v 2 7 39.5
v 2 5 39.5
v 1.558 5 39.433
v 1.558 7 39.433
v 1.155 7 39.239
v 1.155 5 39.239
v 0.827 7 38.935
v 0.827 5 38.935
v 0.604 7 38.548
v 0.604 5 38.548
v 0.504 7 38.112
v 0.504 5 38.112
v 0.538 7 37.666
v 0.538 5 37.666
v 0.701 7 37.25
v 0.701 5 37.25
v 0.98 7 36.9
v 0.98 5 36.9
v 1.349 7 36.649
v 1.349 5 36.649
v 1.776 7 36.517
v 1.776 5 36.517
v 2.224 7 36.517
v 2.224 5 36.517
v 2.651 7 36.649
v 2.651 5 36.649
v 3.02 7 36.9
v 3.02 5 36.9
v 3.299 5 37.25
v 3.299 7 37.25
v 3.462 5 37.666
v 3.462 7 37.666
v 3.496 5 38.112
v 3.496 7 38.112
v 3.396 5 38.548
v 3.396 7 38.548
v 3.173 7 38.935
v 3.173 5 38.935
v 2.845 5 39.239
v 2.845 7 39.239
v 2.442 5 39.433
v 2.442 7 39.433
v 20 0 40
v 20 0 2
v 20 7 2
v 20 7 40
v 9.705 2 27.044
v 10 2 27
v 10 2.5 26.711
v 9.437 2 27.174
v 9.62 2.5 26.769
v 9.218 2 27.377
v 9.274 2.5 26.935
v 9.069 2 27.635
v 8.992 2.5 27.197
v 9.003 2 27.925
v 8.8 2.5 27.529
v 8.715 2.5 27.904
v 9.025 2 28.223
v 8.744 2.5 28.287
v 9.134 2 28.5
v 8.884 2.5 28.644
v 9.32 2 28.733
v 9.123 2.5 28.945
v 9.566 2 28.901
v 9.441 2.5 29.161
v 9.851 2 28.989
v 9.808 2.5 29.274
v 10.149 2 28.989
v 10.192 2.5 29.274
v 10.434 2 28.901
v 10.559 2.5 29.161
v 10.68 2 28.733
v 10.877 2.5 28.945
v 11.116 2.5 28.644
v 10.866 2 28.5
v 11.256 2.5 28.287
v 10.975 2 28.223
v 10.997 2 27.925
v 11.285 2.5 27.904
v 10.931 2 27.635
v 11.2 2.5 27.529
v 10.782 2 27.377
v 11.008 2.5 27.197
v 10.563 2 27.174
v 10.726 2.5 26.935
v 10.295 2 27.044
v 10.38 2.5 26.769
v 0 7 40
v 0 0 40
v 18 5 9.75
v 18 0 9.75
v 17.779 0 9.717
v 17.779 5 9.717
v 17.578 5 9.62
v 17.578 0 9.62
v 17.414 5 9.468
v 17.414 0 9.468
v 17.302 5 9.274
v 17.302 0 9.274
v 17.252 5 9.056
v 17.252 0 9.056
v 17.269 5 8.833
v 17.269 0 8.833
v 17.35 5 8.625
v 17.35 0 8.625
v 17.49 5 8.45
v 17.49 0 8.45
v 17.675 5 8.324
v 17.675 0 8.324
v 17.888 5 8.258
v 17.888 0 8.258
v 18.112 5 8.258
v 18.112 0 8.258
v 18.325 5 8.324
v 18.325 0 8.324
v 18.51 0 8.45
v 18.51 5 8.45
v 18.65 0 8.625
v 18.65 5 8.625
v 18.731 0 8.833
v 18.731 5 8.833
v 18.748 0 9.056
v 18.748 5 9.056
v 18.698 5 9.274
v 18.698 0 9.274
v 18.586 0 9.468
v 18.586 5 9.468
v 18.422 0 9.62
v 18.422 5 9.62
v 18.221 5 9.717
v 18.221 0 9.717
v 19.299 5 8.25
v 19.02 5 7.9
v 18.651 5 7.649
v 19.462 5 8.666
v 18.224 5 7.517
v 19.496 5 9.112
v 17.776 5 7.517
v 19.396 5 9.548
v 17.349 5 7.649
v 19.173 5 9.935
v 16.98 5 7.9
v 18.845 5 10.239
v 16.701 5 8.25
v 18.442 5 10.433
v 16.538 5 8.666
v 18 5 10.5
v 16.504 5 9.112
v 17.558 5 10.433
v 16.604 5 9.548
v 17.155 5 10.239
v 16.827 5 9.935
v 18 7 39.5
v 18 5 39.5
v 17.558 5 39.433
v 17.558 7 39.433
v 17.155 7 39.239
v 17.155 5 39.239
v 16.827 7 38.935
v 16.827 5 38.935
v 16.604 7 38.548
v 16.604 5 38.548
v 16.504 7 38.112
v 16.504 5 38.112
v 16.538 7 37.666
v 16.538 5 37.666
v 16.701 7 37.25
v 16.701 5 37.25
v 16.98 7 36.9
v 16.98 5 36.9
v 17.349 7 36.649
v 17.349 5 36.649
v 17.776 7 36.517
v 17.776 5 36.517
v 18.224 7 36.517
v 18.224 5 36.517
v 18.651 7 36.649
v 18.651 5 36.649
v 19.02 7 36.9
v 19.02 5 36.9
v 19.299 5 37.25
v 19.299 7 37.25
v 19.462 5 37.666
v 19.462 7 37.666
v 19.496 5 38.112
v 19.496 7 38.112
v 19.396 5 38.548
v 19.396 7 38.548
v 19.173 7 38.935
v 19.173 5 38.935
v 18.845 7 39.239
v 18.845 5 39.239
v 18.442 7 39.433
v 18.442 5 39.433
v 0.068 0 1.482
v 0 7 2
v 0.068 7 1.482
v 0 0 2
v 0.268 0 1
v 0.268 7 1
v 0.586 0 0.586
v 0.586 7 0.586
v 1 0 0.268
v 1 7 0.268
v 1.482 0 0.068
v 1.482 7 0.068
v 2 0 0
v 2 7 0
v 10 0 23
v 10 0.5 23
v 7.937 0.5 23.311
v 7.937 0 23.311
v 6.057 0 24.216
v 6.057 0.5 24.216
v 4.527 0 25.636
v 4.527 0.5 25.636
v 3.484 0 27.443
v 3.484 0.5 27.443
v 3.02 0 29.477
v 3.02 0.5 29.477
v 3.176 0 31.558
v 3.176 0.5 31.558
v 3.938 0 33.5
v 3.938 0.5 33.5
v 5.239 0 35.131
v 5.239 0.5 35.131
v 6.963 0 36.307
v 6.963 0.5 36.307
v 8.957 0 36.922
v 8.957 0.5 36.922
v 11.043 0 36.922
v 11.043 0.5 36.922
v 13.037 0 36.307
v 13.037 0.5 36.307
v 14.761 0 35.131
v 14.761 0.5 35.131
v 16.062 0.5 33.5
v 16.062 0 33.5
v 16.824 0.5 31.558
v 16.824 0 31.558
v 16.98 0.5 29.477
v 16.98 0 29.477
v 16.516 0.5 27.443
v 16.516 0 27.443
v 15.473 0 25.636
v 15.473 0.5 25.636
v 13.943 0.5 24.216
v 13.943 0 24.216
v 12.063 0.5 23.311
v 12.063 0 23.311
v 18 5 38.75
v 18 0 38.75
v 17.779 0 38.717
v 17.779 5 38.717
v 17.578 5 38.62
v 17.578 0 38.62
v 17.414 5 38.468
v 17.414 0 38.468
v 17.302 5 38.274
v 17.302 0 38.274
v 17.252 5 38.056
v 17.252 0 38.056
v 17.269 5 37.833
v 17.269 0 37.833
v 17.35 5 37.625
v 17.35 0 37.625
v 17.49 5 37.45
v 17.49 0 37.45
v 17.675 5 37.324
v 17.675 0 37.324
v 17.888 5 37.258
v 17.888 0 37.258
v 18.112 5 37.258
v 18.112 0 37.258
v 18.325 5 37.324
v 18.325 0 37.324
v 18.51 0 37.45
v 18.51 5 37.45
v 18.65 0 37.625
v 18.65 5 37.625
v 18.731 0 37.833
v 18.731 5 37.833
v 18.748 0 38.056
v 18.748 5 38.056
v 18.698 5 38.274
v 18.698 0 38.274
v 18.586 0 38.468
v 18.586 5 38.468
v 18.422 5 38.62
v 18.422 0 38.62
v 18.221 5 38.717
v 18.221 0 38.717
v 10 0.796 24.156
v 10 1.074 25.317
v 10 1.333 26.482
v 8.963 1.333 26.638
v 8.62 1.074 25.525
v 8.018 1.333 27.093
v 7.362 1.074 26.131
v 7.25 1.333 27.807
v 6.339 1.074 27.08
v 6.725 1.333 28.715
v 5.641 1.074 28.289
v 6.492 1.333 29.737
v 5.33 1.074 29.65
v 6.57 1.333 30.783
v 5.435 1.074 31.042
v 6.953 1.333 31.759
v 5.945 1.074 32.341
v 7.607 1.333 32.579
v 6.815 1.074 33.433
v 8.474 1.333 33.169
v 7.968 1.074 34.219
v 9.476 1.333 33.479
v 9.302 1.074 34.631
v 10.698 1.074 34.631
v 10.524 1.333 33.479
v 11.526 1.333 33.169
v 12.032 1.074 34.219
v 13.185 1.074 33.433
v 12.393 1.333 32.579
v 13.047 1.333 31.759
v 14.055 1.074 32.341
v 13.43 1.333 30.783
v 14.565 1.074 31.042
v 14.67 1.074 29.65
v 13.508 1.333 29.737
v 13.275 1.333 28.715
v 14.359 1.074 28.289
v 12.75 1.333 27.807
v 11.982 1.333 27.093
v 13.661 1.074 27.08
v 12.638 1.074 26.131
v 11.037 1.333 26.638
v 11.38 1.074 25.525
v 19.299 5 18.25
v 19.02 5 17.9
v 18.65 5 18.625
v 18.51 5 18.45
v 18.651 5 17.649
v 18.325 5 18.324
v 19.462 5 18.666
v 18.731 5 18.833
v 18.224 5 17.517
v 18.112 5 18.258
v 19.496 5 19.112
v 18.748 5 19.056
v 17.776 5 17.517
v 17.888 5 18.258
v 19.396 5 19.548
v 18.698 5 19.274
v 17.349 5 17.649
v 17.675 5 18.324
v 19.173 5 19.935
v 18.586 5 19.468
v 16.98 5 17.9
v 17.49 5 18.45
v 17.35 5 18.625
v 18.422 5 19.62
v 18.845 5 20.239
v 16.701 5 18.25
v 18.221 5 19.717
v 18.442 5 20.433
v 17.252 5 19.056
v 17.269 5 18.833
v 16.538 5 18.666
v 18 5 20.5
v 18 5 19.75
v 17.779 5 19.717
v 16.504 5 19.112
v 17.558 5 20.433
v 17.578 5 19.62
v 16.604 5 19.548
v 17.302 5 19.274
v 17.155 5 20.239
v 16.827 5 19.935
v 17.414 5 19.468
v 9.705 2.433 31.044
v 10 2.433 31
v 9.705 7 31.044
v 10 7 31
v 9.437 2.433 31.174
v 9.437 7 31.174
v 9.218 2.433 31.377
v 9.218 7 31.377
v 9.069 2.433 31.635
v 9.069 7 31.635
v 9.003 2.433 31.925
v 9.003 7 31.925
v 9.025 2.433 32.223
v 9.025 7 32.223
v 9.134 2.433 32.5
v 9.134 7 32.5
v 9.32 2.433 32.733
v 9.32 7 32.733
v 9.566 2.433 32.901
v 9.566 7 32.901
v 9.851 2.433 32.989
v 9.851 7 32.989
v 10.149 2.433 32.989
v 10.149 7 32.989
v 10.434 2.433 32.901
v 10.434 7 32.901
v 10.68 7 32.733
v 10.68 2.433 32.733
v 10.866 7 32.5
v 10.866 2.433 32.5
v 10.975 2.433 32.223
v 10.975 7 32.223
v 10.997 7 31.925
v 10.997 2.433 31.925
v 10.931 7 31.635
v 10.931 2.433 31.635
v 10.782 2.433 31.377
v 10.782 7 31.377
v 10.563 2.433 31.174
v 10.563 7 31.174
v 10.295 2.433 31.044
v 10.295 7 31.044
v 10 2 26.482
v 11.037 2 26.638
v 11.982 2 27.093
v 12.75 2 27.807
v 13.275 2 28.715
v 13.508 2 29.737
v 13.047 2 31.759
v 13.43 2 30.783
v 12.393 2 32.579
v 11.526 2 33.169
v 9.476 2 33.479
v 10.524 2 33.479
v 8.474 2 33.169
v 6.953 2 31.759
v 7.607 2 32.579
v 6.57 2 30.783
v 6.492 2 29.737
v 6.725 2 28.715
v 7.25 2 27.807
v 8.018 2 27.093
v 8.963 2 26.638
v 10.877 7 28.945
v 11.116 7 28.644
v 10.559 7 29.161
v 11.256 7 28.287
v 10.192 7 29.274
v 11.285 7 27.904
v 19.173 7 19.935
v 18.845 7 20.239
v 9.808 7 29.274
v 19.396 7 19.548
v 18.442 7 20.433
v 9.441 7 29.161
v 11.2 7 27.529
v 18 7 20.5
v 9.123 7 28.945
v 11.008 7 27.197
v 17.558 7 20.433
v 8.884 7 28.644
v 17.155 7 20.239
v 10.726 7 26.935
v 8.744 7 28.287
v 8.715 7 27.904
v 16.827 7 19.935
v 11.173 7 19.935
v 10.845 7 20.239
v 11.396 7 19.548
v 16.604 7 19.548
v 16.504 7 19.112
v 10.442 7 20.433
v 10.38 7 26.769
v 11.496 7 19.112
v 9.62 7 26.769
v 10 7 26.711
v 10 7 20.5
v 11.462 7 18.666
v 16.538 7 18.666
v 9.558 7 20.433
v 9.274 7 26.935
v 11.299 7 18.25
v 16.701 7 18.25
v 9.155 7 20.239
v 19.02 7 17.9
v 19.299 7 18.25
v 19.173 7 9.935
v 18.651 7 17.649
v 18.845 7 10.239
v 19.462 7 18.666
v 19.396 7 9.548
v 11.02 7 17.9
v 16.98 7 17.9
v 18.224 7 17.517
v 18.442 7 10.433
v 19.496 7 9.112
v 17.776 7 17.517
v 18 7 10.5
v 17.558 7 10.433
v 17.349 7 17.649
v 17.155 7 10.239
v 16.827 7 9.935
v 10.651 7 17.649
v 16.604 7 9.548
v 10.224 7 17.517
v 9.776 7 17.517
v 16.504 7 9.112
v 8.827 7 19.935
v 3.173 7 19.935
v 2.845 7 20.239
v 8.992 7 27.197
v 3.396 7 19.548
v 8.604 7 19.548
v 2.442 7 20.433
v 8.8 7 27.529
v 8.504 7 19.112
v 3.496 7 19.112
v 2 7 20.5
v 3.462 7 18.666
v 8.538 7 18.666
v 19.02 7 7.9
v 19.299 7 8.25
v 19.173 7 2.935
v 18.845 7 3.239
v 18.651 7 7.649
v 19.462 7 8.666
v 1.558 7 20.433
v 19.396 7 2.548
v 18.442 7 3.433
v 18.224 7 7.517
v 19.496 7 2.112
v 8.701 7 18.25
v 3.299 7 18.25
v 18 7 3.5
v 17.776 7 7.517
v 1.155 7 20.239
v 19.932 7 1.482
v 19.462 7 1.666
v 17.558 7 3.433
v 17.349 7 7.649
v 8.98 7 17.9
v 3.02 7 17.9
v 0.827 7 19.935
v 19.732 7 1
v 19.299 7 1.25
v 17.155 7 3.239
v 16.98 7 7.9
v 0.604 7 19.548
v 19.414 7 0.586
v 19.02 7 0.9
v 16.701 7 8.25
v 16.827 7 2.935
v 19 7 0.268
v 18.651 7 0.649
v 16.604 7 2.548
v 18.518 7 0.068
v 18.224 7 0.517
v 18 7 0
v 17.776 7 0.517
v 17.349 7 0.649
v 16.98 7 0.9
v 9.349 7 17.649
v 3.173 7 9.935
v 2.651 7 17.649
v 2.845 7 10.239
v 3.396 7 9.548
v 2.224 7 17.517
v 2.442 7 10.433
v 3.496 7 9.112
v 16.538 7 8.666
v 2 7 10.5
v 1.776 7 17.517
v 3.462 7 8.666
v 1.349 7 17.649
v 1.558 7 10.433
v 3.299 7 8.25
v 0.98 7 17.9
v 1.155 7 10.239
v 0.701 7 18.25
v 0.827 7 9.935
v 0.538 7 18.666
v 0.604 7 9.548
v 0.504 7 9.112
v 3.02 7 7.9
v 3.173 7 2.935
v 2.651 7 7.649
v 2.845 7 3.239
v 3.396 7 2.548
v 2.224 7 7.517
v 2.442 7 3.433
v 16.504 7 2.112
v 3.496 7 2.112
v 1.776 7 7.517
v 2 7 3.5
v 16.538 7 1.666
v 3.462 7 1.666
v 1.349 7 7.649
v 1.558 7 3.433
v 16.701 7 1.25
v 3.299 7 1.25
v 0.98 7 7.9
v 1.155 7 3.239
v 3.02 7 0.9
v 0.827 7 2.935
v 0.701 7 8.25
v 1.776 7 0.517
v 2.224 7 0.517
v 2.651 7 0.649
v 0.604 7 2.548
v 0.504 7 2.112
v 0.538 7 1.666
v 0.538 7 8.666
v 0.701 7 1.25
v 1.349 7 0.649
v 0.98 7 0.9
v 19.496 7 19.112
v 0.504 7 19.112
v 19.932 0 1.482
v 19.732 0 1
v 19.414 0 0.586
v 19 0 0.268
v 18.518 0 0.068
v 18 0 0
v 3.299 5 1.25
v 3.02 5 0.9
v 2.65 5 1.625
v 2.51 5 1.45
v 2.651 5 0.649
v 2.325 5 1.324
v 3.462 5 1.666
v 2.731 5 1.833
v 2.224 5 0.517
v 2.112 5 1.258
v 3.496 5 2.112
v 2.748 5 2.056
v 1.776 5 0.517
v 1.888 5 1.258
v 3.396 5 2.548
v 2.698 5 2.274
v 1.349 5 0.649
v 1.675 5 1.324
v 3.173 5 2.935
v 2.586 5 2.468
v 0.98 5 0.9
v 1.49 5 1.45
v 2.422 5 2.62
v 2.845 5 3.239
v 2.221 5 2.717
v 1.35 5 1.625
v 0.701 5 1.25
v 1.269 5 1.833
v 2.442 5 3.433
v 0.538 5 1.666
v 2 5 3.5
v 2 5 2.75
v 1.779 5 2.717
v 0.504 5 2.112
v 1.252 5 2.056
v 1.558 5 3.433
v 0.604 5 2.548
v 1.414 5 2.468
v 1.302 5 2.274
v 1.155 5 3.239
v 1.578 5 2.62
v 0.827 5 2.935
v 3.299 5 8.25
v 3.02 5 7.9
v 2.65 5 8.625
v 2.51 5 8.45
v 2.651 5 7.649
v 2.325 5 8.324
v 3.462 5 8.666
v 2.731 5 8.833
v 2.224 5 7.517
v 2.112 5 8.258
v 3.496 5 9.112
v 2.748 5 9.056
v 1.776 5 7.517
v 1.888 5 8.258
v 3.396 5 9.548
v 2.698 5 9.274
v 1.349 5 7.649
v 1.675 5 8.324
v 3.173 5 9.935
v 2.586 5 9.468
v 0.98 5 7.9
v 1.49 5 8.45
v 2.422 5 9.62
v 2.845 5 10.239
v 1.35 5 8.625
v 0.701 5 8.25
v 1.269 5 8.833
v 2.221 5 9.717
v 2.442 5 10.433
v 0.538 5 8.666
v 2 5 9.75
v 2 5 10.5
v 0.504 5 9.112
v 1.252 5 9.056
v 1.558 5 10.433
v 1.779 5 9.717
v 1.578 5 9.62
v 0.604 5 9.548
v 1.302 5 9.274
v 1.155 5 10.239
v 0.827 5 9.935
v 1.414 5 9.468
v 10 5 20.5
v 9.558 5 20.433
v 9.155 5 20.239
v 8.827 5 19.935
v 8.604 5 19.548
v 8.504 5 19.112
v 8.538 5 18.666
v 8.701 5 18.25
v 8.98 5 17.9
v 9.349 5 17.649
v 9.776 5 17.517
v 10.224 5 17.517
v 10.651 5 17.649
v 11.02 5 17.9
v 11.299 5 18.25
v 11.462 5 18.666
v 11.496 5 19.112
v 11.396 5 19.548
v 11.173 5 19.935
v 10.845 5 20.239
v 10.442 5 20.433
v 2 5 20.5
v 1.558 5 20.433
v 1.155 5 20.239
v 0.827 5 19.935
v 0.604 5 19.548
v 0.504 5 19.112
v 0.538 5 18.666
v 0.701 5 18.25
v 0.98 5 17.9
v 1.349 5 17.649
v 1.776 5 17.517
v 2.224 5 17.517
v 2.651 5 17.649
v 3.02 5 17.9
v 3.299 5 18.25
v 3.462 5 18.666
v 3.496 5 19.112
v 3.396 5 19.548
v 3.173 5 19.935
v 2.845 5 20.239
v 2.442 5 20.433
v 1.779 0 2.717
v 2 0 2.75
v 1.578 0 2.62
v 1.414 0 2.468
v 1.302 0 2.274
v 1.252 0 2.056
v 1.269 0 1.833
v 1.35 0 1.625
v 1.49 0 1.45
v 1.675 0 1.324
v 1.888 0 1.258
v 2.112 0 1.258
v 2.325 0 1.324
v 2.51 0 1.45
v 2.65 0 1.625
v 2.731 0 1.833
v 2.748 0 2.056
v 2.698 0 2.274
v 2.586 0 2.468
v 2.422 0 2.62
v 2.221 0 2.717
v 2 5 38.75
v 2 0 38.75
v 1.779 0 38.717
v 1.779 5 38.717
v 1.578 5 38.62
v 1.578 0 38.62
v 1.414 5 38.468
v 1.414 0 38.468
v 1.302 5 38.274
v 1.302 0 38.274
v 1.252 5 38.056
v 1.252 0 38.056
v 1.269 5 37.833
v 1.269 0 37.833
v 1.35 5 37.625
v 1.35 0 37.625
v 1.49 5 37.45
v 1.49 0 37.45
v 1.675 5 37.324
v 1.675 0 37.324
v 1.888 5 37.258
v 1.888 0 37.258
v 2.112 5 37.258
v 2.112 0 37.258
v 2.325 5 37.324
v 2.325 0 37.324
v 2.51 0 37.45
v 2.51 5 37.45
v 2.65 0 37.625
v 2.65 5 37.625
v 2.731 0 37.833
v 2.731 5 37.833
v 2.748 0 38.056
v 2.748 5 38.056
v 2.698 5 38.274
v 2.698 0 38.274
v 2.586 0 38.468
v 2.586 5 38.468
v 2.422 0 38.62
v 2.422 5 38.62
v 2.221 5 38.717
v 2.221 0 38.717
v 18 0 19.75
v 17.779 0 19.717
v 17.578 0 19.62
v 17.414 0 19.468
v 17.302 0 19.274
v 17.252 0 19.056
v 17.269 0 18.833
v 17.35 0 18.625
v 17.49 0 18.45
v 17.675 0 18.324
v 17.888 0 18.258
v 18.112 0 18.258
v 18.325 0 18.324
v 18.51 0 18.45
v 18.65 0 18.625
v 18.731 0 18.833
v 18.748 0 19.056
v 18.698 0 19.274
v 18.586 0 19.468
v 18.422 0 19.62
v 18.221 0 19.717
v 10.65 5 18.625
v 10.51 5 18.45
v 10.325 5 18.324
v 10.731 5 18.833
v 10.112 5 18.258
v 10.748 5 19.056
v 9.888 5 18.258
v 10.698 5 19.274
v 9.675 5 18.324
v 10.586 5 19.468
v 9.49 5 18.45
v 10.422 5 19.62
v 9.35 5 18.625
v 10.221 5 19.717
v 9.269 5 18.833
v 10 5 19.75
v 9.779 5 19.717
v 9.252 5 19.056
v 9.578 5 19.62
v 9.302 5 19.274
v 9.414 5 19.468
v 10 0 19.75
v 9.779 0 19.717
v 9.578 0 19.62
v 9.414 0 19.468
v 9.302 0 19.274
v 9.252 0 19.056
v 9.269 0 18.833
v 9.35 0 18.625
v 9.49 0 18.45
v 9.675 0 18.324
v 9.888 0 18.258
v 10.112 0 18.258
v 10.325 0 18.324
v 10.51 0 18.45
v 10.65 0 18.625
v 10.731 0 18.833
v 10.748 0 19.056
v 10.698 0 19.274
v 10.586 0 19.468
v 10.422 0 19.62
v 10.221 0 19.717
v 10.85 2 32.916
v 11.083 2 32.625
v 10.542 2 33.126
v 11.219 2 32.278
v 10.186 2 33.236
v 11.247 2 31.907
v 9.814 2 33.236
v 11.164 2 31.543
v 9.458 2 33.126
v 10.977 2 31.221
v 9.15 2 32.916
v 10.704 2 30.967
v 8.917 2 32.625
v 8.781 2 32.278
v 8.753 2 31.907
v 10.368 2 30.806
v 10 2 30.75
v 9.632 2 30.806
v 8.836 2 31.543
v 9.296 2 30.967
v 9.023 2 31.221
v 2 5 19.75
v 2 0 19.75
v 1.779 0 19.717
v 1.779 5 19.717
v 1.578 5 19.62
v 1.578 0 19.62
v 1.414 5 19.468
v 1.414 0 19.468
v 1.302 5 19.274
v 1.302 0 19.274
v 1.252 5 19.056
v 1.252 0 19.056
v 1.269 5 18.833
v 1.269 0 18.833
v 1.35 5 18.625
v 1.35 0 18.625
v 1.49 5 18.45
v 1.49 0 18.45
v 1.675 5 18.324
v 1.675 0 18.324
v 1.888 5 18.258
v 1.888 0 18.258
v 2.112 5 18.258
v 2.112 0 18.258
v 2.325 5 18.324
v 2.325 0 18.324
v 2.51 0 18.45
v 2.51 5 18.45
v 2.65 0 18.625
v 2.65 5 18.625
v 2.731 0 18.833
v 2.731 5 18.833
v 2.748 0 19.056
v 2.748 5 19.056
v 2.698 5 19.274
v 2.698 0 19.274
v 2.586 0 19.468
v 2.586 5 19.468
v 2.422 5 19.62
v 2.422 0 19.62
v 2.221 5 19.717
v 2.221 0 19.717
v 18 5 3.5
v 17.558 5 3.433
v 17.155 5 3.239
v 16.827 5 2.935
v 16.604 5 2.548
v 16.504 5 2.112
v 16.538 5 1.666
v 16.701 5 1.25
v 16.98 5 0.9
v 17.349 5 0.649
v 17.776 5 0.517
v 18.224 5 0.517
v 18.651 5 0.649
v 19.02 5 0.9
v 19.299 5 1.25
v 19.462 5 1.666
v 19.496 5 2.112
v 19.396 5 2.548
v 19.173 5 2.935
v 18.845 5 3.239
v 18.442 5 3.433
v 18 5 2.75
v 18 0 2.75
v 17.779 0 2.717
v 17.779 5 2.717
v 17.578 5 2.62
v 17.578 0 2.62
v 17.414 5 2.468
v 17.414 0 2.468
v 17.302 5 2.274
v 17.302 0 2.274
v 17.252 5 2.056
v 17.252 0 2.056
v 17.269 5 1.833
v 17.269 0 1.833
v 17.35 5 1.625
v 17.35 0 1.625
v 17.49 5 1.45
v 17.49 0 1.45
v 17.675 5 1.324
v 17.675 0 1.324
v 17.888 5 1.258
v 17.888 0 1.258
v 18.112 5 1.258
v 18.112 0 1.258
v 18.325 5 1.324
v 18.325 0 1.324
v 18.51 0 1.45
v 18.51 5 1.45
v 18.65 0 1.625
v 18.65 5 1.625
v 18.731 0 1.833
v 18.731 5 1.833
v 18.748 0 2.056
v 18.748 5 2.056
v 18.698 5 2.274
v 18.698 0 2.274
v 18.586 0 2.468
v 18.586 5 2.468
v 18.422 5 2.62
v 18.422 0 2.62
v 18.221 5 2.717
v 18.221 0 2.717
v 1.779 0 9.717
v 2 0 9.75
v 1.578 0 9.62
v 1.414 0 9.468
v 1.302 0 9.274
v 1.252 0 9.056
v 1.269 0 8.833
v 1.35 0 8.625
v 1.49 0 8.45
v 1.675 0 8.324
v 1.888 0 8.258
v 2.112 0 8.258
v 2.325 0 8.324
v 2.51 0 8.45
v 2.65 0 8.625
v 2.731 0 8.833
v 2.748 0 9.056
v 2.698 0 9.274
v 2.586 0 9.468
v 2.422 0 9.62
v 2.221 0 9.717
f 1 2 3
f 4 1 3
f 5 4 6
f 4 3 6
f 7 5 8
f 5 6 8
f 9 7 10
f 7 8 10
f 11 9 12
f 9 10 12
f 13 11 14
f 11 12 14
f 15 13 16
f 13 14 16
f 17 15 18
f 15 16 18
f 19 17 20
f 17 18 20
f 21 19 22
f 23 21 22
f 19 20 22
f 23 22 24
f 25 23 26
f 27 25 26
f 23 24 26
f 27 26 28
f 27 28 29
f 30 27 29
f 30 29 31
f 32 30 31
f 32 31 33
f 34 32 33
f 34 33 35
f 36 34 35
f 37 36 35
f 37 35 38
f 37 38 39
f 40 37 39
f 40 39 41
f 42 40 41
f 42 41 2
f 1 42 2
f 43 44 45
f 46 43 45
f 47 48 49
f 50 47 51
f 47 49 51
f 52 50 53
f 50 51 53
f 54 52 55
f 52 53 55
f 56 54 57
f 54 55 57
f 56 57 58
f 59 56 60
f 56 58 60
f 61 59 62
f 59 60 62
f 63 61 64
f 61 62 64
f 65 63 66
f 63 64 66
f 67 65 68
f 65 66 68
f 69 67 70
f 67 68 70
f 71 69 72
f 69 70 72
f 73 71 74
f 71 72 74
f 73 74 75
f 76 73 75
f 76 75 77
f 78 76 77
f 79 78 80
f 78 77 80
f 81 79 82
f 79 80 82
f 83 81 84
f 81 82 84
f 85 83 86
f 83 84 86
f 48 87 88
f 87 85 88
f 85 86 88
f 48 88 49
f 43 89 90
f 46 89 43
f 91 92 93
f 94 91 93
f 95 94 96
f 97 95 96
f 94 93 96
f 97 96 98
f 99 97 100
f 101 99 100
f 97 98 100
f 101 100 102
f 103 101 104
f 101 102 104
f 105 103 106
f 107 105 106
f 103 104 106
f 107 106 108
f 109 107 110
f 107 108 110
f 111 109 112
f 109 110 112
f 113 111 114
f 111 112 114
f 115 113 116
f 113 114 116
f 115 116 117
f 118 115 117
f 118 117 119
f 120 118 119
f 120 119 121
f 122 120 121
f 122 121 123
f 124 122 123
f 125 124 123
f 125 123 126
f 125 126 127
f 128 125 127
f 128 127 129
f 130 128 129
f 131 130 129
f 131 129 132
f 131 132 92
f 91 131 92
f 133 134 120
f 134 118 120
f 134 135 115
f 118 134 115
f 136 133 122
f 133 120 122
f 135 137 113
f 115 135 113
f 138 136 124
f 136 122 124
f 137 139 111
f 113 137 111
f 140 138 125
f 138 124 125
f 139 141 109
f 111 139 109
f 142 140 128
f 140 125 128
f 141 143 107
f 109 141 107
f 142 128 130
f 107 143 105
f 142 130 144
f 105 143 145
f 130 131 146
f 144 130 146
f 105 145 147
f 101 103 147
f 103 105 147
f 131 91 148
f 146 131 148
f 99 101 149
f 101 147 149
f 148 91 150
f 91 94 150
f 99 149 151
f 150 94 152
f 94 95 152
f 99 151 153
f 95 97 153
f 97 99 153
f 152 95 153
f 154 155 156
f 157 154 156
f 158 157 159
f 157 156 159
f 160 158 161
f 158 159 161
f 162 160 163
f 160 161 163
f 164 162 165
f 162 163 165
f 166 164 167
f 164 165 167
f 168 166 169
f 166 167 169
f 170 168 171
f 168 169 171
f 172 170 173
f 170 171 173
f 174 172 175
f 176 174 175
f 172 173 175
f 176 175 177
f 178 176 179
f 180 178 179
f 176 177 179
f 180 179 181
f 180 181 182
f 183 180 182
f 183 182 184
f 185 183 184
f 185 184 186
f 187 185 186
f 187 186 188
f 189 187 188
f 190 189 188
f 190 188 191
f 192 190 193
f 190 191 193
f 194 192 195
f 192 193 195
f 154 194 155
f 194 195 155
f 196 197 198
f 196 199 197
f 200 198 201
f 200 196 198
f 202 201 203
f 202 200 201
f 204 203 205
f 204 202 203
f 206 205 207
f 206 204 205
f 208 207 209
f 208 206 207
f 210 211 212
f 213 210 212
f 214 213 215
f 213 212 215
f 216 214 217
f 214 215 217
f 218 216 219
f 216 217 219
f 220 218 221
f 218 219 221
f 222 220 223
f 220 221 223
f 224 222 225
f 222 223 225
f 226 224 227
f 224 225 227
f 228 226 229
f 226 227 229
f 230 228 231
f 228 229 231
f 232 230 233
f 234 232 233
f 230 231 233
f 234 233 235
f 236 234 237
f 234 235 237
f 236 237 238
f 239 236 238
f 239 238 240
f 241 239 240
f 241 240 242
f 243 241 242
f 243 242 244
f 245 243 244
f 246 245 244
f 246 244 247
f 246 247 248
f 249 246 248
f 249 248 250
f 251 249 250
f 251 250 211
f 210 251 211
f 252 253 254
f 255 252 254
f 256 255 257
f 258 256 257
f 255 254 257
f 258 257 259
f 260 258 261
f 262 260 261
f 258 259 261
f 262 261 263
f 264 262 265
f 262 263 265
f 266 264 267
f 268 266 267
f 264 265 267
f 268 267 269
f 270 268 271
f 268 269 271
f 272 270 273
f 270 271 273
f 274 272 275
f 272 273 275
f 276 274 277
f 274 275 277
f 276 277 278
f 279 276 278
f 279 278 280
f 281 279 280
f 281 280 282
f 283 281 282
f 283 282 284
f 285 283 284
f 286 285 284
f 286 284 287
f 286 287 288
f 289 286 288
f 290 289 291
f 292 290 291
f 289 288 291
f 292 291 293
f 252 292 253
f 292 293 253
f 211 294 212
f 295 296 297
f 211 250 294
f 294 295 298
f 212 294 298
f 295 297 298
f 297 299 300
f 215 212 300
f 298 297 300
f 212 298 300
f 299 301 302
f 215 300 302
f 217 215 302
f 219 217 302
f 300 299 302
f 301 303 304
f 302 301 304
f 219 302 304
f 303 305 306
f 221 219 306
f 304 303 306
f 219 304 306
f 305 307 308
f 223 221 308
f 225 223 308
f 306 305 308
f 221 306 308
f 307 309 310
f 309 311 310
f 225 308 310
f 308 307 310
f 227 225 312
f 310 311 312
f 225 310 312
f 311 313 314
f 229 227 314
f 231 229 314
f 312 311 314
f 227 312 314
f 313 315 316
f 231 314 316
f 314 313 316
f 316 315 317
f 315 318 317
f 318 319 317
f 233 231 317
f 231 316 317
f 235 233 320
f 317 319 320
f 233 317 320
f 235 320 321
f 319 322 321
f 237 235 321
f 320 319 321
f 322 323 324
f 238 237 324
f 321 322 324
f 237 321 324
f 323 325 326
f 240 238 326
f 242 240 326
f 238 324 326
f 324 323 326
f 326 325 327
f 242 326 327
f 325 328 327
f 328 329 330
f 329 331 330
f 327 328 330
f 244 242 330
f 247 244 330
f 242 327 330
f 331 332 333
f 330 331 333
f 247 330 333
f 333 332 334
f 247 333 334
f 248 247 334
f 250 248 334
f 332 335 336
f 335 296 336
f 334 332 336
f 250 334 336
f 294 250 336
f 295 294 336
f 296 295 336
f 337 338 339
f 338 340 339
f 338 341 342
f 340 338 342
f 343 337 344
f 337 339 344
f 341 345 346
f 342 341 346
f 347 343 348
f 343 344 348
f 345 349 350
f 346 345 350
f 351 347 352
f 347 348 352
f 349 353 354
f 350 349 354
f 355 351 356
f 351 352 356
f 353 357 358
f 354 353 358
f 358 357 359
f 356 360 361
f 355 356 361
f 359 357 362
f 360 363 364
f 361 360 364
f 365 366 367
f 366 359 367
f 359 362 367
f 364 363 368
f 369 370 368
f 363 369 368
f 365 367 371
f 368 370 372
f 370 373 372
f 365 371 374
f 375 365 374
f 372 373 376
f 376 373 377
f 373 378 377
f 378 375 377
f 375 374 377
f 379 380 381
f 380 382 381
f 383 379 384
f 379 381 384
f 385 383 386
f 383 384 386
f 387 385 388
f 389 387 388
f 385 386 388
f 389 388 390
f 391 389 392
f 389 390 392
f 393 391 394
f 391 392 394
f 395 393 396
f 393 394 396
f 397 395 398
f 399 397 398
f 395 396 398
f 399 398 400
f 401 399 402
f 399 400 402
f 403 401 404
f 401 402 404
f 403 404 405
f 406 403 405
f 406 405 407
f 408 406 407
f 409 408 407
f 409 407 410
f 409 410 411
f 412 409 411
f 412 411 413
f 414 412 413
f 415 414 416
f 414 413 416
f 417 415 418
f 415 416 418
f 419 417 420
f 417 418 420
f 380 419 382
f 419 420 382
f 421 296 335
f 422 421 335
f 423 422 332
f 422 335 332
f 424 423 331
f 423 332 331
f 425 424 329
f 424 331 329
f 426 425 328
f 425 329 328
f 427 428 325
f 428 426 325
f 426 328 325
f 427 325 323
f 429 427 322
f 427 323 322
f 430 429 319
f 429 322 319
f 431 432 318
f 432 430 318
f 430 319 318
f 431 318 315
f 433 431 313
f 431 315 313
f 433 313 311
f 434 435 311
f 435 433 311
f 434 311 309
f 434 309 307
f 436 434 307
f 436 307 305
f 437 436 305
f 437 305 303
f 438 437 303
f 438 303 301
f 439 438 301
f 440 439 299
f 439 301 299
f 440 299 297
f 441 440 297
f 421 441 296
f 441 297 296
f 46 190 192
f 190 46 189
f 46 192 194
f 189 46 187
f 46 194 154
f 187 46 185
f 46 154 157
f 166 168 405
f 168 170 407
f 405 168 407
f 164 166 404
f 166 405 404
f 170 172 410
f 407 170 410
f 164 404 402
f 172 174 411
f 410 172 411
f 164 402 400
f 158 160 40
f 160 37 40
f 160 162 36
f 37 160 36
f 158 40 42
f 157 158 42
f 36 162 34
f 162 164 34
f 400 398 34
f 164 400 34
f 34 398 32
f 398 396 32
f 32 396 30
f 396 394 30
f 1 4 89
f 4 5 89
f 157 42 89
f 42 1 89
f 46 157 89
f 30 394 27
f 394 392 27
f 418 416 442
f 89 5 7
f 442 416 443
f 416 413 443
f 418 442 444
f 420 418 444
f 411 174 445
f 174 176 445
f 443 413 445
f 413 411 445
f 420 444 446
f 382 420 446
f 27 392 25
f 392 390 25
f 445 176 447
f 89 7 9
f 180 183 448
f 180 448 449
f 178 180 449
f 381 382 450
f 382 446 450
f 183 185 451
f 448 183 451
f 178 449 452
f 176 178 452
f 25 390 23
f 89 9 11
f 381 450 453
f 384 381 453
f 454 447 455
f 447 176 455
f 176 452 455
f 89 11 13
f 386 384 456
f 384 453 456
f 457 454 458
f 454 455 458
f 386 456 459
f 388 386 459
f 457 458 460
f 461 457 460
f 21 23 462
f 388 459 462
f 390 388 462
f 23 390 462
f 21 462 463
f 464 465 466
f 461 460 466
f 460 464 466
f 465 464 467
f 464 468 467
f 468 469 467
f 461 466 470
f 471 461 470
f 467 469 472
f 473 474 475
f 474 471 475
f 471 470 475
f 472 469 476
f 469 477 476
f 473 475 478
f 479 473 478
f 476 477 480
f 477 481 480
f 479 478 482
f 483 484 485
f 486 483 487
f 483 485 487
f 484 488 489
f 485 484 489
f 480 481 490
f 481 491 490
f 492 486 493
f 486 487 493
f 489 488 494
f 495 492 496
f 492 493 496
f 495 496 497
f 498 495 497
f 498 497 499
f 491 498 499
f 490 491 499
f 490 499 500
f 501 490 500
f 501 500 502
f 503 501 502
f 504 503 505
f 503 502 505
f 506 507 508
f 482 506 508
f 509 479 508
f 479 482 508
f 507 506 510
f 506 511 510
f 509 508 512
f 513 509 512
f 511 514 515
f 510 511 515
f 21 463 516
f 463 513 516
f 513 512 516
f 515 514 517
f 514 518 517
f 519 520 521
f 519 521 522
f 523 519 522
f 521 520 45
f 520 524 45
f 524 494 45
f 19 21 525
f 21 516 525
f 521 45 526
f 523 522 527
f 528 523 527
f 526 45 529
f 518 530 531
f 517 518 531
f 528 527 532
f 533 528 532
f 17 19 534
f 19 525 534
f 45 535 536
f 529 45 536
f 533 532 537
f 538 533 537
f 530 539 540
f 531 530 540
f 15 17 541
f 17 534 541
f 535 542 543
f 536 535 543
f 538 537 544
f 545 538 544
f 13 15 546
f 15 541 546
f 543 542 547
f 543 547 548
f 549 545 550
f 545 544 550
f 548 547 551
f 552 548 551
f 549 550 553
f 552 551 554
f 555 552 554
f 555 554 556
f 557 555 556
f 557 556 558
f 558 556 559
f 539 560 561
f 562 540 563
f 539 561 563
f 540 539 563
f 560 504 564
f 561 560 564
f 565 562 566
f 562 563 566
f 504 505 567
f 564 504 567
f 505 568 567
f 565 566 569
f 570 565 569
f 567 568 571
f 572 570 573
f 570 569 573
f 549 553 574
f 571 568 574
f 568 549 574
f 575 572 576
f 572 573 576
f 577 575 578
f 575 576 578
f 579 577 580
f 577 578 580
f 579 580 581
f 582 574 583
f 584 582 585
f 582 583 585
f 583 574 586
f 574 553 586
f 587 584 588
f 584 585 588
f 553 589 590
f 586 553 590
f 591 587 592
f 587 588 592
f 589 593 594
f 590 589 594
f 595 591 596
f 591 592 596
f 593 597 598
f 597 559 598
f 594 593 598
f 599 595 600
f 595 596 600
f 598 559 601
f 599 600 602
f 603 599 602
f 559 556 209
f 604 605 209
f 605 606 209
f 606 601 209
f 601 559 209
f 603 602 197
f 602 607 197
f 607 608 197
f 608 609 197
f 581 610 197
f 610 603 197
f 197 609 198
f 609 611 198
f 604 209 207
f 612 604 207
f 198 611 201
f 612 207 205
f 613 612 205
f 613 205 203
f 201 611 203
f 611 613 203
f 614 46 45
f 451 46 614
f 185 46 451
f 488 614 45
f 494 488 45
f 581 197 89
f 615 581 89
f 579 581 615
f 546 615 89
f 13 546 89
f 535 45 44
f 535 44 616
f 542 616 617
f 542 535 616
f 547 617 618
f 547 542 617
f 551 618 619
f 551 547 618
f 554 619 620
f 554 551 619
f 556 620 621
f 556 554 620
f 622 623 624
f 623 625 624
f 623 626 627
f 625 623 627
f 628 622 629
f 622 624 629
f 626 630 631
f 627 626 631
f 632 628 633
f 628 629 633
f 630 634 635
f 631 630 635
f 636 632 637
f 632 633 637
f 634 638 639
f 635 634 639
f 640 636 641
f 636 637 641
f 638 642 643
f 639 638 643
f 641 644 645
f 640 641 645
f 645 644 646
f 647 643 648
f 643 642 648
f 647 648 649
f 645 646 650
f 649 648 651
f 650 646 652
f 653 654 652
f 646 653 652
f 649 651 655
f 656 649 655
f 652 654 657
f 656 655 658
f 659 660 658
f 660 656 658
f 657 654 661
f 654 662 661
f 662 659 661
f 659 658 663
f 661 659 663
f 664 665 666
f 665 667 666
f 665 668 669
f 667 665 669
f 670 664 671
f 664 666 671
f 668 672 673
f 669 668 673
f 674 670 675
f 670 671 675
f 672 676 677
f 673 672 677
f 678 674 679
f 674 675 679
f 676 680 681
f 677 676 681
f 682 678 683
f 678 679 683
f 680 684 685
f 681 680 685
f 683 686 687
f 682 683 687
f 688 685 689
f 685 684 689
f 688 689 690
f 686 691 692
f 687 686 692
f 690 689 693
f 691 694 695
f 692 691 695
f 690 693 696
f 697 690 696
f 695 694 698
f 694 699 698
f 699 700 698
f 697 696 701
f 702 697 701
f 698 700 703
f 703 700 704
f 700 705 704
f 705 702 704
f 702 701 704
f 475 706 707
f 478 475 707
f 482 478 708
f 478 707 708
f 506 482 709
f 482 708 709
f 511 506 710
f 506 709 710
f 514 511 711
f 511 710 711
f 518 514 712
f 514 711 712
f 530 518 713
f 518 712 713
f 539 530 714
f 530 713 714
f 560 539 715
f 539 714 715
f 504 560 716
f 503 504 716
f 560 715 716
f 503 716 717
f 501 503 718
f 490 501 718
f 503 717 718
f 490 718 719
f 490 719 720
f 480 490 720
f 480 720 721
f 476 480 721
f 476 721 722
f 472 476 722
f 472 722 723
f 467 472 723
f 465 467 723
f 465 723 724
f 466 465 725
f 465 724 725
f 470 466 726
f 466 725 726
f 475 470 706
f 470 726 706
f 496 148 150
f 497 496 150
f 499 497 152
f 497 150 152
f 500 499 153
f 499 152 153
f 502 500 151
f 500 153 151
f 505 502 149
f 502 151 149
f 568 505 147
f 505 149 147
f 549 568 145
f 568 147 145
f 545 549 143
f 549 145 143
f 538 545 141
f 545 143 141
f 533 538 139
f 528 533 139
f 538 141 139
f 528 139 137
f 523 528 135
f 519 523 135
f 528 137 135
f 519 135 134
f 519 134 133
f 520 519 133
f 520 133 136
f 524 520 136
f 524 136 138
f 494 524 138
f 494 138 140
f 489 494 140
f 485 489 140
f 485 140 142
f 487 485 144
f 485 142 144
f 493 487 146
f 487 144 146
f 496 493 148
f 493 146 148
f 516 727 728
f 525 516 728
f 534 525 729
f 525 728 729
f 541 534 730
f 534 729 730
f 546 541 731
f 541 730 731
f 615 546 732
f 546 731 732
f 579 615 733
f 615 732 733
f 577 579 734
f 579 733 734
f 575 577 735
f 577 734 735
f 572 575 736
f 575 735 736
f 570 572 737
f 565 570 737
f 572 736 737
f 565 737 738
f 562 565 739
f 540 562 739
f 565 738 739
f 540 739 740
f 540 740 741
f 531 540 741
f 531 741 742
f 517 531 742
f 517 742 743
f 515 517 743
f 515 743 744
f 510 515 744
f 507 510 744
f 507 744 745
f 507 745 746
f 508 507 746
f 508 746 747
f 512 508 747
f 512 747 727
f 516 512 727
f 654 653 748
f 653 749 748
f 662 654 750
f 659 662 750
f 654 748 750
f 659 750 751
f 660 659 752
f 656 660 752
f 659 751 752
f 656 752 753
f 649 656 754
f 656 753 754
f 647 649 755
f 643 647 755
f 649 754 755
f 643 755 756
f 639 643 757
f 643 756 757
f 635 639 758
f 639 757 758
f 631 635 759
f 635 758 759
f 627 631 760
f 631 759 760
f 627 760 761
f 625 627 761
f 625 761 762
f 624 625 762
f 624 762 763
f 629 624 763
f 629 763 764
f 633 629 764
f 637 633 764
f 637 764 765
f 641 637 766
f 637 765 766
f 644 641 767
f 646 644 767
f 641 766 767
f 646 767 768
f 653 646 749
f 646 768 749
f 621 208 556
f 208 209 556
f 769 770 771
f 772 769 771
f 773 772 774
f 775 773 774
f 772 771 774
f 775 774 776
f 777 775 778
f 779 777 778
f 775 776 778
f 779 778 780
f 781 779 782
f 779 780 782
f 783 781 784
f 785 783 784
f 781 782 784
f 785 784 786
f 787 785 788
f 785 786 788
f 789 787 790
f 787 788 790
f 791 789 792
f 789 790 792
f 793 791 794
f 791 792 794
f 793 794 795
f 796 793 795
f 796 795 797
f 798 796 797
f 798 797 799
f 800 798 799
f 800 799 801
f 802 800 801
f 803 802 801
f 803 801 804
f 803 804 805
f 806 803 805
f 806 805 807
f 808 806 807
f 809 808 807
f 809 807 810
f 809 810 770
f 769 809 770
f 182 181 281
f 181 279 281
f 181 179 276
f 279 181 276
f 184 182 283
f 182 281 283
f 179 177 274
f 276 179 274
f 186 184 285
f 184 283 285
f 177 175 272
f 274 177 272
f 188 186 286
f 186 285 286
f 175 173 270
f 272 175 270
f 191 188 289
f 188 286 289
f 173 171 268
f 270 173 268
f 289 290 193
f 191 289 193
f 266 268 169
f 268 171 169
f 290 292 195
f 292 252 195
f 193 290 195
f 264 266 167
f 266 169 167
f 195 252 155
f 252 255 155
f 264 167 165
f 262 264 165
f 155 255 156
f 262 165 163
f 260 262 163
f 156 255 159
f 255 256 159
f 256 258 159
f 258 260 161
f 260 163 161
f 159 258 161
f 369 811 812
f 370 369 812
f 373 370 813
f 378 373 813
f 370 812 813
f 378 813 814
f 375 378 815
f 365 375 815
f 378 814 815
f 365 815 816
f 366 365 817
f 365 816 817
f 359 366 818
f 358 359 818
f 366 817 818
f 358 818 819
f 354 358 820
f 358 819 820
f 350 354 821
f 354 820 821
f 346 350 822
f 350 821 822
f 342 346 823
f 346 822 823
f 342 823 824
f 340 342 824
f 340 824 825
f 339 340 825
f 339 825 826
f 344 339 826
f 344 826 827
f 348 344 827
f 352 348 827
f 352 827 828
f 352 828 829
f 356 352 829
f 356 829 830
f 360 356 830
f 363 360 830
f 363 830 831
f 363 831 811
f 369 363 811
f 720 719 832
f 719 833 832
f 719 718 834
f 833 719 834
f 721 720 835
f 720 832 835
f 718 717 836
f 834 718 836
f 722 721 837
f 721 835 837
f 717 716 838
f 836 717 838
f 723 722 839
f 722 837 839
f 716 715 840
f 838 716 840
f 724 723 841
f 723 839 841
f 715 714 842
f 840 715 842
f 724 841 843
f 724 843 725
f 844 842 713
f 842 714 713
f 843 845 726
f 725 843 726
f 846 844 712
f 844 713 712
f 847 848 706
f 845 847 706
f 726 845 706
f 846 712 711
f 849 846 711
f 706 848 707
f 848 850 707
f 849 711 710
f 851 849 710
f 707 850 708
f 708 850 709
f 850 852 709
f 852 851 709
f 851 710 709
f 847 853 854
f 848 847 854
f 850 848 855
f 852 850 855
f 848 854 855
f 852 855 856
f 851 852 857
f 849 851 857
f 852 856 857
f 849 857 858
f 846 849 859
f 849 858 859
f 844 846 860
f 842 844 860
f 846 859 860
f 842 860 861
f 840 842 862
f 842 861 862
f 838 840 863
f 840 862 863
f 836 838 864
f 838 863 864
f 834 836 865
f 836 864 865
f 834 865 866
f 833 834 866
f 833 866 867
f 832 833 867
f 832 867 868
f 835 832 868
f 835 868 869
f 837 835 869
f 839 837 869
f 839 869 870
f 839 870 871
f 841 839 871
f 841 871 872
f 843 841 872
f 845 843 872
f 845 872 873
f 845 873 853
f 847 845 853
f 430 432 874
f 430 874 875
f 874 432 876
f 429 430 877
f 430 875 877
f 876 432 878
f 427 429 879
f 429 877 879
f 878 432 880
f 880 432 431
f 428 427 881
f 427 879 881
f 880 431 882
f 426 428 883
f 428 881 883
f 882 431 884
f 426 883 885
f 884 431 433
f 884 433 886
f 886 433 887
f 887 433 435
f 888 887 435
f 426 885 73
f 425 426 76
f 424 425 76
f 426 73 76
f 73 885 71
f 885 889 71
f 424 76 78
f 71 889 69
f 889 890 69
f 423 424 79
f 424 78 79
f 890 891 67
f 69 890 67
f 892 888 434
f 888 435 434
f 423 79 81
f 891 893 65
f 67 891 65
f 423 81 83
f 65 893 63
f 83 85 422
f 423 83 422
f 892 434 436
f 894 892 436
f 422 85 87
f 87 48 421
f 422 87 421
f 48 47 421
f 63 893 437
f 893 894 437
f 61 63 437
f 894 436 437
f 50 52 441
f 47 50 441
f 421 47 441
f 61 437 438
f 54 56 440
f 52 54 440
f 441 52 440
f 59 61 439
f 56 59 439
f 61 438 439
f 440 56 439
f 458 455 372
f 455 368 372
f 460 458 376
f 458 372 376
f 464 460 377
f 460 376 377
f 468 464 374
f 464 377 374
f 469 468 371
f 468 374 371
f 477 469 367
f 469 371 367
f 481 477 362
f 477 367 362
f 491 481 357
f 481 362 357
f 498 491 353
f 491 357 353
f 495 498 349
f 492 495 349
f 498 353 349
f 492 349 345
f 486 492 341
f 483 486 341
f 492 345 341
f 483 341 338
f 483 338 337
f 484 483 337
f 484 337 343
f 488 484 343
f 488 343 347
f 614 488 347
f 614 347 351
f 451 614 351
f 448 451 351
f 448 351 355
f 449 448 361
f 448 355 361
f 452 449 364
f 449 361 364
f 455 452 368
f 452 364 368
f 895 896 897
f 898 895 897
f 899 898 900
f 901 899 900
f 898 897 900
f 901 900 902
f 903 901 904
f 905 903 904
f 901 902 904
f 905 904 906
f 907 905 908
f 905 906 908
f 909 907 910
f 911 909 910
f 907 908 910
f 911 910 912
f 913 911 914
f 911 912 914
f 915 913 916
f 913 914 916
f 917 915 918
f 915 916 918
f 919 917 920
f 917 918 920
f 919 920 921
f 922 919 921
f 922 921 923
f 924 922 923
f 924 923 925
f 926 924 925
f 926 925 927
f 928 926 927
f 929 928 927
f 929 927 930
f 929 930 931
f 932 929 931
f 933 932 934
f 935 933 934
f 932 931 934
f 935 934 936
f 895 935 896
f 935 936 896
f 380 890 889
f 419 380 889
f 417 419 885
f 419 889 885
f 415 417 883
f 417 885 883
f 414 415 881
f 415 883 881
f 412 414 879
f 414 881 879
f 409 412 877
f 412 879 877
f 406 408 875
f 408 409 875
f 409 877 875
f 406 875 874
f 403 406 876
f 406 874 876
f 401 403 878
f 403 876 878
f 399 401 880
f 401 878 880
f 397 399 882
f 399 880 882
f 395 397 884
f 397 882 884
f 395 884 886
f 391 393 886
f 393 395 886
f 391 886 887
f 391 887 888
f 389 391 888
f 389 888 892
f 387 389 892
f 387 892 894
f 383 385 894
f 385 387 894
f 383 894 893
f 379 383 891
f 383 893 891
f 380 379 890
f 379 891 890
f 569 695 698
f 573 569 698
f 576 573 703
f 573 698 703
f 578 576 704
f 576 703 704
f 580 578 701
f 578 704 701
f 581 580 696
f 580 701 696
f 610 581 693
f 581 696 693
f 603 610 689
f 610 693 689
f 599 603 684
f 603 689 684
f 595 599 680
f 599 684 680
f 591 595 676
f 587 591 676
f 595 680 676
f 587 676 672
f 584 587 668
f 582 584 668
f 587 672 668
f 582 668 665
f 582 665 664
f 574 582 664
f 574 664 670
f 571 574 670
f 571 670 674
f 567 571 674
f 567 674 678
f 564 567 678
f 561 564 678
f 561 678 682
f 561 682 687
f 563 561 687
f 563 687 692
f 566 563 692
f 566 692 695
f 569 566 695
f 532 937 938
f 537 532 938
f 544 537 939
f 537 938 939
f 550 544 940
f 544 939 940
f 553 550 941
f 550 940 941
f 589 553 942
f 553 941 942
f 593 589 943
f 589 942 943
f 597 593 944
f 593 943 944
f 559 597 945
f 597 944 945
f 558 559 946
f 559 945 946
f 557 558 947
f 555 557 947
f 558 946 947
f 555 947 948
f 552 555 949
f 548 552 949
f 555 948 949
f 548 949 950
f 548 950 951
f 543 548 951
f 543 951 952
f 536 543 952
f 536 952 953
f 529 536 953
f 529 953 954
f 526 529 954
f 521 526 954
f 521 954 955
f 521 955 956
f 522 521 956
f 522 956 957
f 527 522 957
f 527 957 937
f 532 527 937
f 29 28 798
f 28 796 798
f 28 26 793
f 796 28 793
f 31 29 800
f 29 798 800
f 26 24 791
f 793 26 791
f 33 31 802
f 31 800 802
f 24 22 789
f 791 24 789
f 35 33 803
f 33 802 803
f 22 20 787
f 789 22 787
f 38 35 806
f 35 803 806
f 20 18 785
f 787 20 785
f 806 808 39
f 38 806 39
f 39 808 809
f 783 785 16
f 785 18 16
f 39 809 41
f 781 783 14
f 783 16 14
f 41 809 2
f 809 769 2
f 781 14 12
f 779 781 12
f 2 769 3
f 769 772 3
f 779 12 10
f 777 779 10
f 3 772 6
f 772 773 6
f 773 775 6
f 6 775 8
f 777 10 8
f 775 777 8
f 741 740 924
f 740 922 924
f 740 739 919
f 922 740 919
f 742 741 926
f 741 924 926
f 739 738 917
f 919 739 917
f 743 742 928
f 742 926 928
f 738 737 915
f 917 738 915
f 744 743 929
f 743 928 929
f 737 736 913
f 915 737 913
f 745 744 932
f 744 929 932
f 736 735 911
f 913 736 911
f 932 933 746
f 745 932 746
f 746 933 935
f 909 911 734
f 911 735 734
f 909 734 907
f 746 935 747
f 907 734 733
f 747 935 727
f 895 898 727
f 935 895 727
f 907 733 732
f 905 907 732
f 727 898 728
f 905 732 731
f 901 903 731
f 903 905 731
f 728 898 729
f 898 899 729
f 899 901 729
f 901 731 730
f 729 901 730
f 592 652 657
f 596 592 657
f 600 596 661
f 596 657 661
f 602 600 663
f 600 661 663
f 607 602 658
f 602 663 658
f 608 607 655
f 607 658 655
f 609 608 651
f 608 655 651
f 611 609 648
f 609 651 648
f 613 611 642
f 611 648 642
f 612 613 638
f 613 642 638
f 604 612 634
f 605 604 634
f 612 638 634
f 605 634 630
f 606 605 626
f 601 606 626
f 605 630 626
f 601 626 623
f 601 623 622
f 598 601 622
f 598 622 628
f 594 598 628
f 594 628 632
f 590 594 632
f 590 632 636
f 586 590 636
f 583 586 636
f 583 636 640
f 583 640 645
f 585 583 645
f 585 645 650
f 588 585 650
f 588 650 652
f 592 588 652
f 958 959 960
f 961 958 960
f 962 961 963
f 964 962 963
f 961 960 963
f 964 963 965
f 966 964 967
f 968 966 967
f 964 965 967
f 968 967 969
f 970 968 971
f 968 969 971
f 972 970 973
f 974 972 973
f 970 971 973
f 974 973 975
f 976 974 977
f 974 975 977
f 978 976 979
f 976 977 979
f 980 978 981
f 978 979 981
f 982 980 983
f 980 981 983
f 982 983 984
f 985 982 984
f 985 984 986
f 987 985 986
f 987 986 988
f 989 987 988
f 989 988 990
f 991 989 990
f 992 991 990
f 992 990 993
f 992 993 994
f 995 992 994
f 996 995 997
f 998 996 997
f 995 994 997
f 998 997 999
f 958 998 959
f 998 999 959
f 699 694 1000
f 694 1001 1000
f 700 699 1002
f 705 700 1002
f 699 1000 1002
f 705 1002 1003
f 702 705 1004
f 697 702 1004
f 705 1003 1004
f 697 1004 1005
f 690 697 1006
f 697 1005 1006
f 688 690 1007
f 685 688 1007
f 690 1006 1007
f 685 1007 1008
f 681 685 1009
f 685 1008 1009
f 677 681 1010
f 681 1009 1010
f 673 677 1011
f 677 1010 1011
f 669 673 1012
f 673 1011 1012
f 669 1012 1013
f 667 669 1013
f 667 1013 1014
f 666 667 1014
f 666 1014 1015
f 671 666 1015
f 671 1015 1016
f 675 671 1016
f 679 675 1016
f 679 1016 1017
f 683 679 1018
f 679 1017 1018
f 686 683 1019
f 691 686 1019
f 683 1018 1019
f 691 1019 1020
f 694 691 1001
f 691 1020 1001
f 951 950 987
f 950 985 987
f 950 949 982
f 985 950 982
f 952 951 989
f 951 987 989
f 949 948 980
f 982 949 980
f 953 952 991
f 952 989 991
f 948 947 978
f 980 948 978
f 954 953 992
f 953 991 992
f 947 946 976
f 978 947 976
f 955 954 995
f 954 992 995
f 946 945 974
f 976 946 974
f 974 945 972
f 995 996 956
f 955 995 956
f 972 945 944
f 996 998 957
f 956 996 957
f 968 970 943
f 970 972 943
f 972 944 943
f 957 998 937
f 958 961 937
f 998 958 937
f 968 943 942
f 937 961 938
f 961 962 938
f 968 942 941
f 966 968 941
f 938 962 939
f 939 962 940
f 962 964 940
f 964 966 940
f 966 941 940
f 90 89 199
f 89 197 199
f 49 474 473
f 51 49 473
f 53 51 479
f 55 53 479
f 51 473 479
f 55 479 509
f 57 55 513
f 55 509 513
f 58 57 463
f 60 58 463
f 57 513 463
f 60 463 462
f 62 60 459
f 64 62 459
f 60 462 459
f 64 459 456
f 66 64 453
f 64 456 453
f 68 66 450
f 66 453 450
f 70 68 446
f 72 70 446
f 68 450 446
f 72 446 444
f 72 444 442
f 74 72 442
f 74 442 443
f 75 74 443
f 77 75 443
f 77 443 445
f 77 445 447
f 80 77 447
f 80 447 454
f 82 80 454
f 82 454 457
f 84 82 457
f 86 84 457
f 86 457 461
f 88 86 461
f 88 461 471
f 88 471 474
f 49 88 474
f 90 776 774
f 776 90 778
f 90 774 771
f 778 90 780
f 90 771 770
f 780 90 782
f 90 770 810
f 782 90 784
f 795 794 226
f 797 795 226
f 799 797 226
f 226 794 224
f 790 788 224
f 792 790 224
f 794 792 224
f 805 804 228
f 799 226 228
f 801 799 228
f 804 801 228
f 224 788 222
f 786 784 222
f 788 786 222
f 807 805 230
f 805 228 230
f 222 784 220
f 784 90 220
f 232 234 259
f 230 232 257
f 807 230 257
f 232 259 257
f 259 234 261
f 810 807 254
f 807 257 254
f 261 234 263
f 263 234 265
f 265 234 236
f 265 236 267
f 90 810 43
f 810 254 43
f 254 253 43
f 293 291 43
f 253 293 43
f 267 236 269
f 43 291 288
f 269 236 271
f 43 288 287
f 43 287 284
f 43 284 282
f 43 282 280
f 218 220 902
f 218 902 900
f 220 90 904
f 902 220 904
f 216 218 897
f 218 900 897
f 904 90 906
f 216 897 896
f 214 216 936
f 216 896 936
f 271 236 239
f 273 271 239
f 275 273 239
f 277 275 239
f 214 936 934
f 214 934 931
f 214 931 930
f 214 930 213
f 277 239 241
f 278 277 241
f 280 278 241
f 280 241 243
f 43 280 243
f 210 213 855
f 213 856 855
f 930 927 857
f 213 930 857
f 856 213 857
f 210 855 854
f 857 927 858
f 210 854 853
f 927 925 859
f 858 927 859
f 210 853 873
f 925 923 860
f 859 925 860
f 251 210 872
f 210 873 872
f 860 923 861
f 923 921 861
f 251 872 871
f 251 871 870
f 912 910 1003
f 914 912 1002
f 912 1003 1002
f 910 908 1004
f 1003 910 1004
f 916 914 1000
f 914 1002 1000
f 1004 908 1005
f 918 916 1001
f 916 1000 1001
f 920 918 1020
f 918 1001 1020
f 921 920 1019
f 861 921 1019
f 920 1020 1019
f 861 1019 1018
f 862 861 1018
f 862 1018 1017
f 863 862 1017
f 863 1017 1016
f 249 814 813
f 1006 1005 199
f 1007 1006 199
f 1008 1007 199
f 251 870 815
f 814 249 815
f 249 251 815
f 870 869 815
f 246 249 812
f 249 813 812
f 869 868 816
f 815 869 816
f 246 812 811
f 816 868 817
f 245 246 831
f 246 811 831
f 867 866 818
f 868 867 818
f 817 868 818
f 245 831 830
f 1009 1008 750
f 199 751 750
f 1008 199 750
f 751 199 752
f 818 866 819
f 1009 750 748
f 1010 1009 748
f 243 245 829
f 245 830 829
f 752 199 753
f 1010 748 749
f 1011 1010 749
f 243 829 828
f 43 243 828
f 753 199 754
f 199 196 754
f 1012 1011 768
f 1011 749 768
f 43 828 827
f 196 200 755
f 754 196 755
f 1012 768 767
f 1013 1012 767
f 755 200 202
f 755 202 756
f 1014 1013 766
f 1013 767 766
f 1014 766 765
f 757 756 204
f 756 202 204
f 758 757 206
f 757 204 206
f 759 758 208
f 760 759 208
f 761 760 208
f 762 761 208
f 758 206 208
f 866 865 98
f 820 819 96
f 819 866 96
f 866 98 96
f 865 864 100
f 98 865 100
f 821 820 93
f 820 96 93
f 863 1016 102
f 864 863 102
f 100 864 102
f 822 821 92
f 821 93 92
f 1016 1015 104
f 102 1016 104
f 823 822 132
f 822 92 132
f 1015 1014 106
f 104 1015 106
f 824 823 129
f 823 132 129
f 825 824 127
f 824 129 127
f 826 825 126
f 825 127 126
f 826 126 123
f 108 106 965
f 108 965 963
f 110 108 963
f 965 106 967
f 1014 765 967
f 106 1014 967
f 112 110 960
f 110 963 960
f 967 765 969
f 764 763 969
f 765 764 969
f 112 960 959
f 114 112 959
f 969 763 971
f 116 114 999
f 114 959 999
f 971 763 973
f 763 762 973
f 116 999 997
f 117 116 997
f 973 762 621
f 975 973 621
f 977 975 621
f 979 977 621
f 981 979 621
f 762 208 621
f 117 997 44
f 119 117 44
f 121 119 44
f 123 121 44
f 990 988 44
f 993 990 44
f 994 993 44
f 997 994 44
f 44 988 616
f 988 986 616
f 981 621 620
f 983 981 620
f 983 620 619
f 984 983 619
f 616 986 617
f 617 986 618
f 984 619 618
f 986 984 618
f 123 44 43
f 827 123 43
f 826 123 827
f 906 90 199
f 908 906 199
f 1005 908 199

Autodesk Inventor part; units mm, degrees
ref_plane "XZ Plane" through (0, 0, 0) normal (0, 1, 0) x (-1, 0, 0)
ref_plane "XY Plane" through (0, 0, 0) normal (0, 0, 1) x (1, 0, 0)
sketch "Sketch2" plane through (0, 0, 0) normal (0, 0, 1) x (1, 0, 0)
  line L0 (0, 0) -> (20, 0)
  line L1 (20, 0) -> (20, 7)
  line L2 (20, 7) -> (0, 7)
  line L3 (0, 7) -> (0, 0)
  dimension "d0" = 20
  dimension "d1" = 7
extrude "Extrusion1" add sketch "Sketch2" along normal blind 40
ref_plane "Work Plane1" through (10, 0, 0) normal (1, 0, 0) x (0, 1, 0)
sketch "Sketch3" plane through (10, 0, 0) normal (1, 0, 0) x (0, 1, 0)
  line L0 (7, 40) -> (0, 40) construction
  line L1 (0, 40) -> (0, 30) construction
  line L2 (0, 0) -> (0, 40) construction
  line L3 (0, 30) -> (2, 30) construction
  line L4 (0, 30) -> (0, 23)
  line L5 (0, 23) -> (0.5, 23)
  line L6 (0, 30) -> (2, 30)
  arc A0 (0.5, 23) -> (1.333, 26.4822) centre (-72.4911, 42.3017) ccw
  line L7 (2, 30) -> (2, 26.4822)
  line L8 (2, 26.4822) -> (1.333, 26.4822)
  dimension "d4" = 10
  dimension "d5" = 2
  dimension "d6" = 7
  dimension "d9" = 0.5
  dimension "d10" = 75.5
revolve "Revolution1" cut sketch "Sketch3" angle 360 about axis through (10, 0, 30) along (0, 1, 0)
sketch "Sketch5" plane through (10, 2, 30) normal (0, -1, 0) x (1, 0, 0)
  circle A0 centre (0, 0) radius 3.5178 projected
  circle A1 centre (0, 2) radius 1
  circle A2 centre (0, -2) radius 1
  line L0 (1.4669, 0) -> (-1.3764, 0) construction
  point P0 (-10, -30)
  dimension "d11" = 2
  dimension "d12" = 2
  dimension "d13" = 2
  dimension "d14" = 2
hole "Hole1" at (10, 2, 32) direction (0, 1, 0) diameter 2 depth 10 countersink diameter 2.5 countersink angle 60 clearance for "Flat Head Machine Screw (82)" size "#0" standard "Ansi Unified Screw Threads"
sketch "Sketch6" plane through (10, 2, 30) normal (0, -1, 0) x (1, 0, 0)
  line L0 (0, 0) -> (1.9071, 0) construction
  circle A0 centre (0, -2) radius 1
  point P0 (-10, -30)
  dimension "d22" = 2
  dimension "d23" = 2
extrude "Extrusion2" cut sketch "Sketch6" against normal blind 40
sketch "Sketch7" plane through (10, 0, 0) normal (1, 0, 0) x (0, 1, 0)
  line L0 (2, 27) -> (2, 29) construction
  line L1 (2, 28) -> (3.2187, 28) construction
  line L2 (2.5, 26.7113) -> (2, 27)
  line L3 (2, 27) -> (2, 29) construction
  line L4 (2, 27) -> (2.7064, 27) construction
  line L5 (2, 29) -> (2.7329, 29) construction
  line L6 (2, 29) -> (7, 29) projected
  line L7 (2, 28) -> (2, 27)
  line L8 (2.5, 26.7113) -> (7.9836, 26.7113)
  line L9 (2, 28) -> (7.9836, 28)
  line L10 (8.4909, 28) -> (8.4909, 26.7113)
  line L11 (8.4909, 26.7113) -> (7.9836, 26.7113)
  line L12 (7.9836, 28) -> (8.4909, 28)
  point P0 (0, 0)
  point P1 (2.5, 28)
  dimension "d26" = 30
revolve "Revolution2" cut sketch "Sketch7" angle 360 about axis through (10, 2, 28) along (0, 1, 0)
fillet "Fillet1" radius 2 2 edges at (0, 3.5, 0) (20, 3.5, 0)
sketch "Sketch9" plane through (0, 7, 40) normal (0, 1, 0) x (1, 0, 0)
  circle A0 centre (2, 2) radius 0.75 projected
  circle A1 centre (2, 21) radius 0.75 projected
  circle A2 centre (2, 31) radius 0.75 projected
  circle A3 centre (2, 38) radius 0.75 projected
  circle A4 centre (18, 38) radius 0.75 projected
  circle A5 centre (18, 31) radius 0.75 projected
  circle A6 centre (18, 21) radius 0.75 projected
  circle A7 centre (10, 21) radius 0.75 projected
  point P0 (0, 40)
  point P1 (18, 2)
hole "Hole3" at (2, 7, 38) at (2, 7, 19) at (2, 7, 9) at (2, 7, 2) at (18, 7, 2) at (18, 7, 9) at (18, 7, 19) at (10, 7, 19) at (18, 7, 38) direction (0, -1, 0) diameter 1.5 depth 10 counterbore diameter 3 counterbore depth 2
properties part number "Nắp hộp piston" material "Iron, Gray"
